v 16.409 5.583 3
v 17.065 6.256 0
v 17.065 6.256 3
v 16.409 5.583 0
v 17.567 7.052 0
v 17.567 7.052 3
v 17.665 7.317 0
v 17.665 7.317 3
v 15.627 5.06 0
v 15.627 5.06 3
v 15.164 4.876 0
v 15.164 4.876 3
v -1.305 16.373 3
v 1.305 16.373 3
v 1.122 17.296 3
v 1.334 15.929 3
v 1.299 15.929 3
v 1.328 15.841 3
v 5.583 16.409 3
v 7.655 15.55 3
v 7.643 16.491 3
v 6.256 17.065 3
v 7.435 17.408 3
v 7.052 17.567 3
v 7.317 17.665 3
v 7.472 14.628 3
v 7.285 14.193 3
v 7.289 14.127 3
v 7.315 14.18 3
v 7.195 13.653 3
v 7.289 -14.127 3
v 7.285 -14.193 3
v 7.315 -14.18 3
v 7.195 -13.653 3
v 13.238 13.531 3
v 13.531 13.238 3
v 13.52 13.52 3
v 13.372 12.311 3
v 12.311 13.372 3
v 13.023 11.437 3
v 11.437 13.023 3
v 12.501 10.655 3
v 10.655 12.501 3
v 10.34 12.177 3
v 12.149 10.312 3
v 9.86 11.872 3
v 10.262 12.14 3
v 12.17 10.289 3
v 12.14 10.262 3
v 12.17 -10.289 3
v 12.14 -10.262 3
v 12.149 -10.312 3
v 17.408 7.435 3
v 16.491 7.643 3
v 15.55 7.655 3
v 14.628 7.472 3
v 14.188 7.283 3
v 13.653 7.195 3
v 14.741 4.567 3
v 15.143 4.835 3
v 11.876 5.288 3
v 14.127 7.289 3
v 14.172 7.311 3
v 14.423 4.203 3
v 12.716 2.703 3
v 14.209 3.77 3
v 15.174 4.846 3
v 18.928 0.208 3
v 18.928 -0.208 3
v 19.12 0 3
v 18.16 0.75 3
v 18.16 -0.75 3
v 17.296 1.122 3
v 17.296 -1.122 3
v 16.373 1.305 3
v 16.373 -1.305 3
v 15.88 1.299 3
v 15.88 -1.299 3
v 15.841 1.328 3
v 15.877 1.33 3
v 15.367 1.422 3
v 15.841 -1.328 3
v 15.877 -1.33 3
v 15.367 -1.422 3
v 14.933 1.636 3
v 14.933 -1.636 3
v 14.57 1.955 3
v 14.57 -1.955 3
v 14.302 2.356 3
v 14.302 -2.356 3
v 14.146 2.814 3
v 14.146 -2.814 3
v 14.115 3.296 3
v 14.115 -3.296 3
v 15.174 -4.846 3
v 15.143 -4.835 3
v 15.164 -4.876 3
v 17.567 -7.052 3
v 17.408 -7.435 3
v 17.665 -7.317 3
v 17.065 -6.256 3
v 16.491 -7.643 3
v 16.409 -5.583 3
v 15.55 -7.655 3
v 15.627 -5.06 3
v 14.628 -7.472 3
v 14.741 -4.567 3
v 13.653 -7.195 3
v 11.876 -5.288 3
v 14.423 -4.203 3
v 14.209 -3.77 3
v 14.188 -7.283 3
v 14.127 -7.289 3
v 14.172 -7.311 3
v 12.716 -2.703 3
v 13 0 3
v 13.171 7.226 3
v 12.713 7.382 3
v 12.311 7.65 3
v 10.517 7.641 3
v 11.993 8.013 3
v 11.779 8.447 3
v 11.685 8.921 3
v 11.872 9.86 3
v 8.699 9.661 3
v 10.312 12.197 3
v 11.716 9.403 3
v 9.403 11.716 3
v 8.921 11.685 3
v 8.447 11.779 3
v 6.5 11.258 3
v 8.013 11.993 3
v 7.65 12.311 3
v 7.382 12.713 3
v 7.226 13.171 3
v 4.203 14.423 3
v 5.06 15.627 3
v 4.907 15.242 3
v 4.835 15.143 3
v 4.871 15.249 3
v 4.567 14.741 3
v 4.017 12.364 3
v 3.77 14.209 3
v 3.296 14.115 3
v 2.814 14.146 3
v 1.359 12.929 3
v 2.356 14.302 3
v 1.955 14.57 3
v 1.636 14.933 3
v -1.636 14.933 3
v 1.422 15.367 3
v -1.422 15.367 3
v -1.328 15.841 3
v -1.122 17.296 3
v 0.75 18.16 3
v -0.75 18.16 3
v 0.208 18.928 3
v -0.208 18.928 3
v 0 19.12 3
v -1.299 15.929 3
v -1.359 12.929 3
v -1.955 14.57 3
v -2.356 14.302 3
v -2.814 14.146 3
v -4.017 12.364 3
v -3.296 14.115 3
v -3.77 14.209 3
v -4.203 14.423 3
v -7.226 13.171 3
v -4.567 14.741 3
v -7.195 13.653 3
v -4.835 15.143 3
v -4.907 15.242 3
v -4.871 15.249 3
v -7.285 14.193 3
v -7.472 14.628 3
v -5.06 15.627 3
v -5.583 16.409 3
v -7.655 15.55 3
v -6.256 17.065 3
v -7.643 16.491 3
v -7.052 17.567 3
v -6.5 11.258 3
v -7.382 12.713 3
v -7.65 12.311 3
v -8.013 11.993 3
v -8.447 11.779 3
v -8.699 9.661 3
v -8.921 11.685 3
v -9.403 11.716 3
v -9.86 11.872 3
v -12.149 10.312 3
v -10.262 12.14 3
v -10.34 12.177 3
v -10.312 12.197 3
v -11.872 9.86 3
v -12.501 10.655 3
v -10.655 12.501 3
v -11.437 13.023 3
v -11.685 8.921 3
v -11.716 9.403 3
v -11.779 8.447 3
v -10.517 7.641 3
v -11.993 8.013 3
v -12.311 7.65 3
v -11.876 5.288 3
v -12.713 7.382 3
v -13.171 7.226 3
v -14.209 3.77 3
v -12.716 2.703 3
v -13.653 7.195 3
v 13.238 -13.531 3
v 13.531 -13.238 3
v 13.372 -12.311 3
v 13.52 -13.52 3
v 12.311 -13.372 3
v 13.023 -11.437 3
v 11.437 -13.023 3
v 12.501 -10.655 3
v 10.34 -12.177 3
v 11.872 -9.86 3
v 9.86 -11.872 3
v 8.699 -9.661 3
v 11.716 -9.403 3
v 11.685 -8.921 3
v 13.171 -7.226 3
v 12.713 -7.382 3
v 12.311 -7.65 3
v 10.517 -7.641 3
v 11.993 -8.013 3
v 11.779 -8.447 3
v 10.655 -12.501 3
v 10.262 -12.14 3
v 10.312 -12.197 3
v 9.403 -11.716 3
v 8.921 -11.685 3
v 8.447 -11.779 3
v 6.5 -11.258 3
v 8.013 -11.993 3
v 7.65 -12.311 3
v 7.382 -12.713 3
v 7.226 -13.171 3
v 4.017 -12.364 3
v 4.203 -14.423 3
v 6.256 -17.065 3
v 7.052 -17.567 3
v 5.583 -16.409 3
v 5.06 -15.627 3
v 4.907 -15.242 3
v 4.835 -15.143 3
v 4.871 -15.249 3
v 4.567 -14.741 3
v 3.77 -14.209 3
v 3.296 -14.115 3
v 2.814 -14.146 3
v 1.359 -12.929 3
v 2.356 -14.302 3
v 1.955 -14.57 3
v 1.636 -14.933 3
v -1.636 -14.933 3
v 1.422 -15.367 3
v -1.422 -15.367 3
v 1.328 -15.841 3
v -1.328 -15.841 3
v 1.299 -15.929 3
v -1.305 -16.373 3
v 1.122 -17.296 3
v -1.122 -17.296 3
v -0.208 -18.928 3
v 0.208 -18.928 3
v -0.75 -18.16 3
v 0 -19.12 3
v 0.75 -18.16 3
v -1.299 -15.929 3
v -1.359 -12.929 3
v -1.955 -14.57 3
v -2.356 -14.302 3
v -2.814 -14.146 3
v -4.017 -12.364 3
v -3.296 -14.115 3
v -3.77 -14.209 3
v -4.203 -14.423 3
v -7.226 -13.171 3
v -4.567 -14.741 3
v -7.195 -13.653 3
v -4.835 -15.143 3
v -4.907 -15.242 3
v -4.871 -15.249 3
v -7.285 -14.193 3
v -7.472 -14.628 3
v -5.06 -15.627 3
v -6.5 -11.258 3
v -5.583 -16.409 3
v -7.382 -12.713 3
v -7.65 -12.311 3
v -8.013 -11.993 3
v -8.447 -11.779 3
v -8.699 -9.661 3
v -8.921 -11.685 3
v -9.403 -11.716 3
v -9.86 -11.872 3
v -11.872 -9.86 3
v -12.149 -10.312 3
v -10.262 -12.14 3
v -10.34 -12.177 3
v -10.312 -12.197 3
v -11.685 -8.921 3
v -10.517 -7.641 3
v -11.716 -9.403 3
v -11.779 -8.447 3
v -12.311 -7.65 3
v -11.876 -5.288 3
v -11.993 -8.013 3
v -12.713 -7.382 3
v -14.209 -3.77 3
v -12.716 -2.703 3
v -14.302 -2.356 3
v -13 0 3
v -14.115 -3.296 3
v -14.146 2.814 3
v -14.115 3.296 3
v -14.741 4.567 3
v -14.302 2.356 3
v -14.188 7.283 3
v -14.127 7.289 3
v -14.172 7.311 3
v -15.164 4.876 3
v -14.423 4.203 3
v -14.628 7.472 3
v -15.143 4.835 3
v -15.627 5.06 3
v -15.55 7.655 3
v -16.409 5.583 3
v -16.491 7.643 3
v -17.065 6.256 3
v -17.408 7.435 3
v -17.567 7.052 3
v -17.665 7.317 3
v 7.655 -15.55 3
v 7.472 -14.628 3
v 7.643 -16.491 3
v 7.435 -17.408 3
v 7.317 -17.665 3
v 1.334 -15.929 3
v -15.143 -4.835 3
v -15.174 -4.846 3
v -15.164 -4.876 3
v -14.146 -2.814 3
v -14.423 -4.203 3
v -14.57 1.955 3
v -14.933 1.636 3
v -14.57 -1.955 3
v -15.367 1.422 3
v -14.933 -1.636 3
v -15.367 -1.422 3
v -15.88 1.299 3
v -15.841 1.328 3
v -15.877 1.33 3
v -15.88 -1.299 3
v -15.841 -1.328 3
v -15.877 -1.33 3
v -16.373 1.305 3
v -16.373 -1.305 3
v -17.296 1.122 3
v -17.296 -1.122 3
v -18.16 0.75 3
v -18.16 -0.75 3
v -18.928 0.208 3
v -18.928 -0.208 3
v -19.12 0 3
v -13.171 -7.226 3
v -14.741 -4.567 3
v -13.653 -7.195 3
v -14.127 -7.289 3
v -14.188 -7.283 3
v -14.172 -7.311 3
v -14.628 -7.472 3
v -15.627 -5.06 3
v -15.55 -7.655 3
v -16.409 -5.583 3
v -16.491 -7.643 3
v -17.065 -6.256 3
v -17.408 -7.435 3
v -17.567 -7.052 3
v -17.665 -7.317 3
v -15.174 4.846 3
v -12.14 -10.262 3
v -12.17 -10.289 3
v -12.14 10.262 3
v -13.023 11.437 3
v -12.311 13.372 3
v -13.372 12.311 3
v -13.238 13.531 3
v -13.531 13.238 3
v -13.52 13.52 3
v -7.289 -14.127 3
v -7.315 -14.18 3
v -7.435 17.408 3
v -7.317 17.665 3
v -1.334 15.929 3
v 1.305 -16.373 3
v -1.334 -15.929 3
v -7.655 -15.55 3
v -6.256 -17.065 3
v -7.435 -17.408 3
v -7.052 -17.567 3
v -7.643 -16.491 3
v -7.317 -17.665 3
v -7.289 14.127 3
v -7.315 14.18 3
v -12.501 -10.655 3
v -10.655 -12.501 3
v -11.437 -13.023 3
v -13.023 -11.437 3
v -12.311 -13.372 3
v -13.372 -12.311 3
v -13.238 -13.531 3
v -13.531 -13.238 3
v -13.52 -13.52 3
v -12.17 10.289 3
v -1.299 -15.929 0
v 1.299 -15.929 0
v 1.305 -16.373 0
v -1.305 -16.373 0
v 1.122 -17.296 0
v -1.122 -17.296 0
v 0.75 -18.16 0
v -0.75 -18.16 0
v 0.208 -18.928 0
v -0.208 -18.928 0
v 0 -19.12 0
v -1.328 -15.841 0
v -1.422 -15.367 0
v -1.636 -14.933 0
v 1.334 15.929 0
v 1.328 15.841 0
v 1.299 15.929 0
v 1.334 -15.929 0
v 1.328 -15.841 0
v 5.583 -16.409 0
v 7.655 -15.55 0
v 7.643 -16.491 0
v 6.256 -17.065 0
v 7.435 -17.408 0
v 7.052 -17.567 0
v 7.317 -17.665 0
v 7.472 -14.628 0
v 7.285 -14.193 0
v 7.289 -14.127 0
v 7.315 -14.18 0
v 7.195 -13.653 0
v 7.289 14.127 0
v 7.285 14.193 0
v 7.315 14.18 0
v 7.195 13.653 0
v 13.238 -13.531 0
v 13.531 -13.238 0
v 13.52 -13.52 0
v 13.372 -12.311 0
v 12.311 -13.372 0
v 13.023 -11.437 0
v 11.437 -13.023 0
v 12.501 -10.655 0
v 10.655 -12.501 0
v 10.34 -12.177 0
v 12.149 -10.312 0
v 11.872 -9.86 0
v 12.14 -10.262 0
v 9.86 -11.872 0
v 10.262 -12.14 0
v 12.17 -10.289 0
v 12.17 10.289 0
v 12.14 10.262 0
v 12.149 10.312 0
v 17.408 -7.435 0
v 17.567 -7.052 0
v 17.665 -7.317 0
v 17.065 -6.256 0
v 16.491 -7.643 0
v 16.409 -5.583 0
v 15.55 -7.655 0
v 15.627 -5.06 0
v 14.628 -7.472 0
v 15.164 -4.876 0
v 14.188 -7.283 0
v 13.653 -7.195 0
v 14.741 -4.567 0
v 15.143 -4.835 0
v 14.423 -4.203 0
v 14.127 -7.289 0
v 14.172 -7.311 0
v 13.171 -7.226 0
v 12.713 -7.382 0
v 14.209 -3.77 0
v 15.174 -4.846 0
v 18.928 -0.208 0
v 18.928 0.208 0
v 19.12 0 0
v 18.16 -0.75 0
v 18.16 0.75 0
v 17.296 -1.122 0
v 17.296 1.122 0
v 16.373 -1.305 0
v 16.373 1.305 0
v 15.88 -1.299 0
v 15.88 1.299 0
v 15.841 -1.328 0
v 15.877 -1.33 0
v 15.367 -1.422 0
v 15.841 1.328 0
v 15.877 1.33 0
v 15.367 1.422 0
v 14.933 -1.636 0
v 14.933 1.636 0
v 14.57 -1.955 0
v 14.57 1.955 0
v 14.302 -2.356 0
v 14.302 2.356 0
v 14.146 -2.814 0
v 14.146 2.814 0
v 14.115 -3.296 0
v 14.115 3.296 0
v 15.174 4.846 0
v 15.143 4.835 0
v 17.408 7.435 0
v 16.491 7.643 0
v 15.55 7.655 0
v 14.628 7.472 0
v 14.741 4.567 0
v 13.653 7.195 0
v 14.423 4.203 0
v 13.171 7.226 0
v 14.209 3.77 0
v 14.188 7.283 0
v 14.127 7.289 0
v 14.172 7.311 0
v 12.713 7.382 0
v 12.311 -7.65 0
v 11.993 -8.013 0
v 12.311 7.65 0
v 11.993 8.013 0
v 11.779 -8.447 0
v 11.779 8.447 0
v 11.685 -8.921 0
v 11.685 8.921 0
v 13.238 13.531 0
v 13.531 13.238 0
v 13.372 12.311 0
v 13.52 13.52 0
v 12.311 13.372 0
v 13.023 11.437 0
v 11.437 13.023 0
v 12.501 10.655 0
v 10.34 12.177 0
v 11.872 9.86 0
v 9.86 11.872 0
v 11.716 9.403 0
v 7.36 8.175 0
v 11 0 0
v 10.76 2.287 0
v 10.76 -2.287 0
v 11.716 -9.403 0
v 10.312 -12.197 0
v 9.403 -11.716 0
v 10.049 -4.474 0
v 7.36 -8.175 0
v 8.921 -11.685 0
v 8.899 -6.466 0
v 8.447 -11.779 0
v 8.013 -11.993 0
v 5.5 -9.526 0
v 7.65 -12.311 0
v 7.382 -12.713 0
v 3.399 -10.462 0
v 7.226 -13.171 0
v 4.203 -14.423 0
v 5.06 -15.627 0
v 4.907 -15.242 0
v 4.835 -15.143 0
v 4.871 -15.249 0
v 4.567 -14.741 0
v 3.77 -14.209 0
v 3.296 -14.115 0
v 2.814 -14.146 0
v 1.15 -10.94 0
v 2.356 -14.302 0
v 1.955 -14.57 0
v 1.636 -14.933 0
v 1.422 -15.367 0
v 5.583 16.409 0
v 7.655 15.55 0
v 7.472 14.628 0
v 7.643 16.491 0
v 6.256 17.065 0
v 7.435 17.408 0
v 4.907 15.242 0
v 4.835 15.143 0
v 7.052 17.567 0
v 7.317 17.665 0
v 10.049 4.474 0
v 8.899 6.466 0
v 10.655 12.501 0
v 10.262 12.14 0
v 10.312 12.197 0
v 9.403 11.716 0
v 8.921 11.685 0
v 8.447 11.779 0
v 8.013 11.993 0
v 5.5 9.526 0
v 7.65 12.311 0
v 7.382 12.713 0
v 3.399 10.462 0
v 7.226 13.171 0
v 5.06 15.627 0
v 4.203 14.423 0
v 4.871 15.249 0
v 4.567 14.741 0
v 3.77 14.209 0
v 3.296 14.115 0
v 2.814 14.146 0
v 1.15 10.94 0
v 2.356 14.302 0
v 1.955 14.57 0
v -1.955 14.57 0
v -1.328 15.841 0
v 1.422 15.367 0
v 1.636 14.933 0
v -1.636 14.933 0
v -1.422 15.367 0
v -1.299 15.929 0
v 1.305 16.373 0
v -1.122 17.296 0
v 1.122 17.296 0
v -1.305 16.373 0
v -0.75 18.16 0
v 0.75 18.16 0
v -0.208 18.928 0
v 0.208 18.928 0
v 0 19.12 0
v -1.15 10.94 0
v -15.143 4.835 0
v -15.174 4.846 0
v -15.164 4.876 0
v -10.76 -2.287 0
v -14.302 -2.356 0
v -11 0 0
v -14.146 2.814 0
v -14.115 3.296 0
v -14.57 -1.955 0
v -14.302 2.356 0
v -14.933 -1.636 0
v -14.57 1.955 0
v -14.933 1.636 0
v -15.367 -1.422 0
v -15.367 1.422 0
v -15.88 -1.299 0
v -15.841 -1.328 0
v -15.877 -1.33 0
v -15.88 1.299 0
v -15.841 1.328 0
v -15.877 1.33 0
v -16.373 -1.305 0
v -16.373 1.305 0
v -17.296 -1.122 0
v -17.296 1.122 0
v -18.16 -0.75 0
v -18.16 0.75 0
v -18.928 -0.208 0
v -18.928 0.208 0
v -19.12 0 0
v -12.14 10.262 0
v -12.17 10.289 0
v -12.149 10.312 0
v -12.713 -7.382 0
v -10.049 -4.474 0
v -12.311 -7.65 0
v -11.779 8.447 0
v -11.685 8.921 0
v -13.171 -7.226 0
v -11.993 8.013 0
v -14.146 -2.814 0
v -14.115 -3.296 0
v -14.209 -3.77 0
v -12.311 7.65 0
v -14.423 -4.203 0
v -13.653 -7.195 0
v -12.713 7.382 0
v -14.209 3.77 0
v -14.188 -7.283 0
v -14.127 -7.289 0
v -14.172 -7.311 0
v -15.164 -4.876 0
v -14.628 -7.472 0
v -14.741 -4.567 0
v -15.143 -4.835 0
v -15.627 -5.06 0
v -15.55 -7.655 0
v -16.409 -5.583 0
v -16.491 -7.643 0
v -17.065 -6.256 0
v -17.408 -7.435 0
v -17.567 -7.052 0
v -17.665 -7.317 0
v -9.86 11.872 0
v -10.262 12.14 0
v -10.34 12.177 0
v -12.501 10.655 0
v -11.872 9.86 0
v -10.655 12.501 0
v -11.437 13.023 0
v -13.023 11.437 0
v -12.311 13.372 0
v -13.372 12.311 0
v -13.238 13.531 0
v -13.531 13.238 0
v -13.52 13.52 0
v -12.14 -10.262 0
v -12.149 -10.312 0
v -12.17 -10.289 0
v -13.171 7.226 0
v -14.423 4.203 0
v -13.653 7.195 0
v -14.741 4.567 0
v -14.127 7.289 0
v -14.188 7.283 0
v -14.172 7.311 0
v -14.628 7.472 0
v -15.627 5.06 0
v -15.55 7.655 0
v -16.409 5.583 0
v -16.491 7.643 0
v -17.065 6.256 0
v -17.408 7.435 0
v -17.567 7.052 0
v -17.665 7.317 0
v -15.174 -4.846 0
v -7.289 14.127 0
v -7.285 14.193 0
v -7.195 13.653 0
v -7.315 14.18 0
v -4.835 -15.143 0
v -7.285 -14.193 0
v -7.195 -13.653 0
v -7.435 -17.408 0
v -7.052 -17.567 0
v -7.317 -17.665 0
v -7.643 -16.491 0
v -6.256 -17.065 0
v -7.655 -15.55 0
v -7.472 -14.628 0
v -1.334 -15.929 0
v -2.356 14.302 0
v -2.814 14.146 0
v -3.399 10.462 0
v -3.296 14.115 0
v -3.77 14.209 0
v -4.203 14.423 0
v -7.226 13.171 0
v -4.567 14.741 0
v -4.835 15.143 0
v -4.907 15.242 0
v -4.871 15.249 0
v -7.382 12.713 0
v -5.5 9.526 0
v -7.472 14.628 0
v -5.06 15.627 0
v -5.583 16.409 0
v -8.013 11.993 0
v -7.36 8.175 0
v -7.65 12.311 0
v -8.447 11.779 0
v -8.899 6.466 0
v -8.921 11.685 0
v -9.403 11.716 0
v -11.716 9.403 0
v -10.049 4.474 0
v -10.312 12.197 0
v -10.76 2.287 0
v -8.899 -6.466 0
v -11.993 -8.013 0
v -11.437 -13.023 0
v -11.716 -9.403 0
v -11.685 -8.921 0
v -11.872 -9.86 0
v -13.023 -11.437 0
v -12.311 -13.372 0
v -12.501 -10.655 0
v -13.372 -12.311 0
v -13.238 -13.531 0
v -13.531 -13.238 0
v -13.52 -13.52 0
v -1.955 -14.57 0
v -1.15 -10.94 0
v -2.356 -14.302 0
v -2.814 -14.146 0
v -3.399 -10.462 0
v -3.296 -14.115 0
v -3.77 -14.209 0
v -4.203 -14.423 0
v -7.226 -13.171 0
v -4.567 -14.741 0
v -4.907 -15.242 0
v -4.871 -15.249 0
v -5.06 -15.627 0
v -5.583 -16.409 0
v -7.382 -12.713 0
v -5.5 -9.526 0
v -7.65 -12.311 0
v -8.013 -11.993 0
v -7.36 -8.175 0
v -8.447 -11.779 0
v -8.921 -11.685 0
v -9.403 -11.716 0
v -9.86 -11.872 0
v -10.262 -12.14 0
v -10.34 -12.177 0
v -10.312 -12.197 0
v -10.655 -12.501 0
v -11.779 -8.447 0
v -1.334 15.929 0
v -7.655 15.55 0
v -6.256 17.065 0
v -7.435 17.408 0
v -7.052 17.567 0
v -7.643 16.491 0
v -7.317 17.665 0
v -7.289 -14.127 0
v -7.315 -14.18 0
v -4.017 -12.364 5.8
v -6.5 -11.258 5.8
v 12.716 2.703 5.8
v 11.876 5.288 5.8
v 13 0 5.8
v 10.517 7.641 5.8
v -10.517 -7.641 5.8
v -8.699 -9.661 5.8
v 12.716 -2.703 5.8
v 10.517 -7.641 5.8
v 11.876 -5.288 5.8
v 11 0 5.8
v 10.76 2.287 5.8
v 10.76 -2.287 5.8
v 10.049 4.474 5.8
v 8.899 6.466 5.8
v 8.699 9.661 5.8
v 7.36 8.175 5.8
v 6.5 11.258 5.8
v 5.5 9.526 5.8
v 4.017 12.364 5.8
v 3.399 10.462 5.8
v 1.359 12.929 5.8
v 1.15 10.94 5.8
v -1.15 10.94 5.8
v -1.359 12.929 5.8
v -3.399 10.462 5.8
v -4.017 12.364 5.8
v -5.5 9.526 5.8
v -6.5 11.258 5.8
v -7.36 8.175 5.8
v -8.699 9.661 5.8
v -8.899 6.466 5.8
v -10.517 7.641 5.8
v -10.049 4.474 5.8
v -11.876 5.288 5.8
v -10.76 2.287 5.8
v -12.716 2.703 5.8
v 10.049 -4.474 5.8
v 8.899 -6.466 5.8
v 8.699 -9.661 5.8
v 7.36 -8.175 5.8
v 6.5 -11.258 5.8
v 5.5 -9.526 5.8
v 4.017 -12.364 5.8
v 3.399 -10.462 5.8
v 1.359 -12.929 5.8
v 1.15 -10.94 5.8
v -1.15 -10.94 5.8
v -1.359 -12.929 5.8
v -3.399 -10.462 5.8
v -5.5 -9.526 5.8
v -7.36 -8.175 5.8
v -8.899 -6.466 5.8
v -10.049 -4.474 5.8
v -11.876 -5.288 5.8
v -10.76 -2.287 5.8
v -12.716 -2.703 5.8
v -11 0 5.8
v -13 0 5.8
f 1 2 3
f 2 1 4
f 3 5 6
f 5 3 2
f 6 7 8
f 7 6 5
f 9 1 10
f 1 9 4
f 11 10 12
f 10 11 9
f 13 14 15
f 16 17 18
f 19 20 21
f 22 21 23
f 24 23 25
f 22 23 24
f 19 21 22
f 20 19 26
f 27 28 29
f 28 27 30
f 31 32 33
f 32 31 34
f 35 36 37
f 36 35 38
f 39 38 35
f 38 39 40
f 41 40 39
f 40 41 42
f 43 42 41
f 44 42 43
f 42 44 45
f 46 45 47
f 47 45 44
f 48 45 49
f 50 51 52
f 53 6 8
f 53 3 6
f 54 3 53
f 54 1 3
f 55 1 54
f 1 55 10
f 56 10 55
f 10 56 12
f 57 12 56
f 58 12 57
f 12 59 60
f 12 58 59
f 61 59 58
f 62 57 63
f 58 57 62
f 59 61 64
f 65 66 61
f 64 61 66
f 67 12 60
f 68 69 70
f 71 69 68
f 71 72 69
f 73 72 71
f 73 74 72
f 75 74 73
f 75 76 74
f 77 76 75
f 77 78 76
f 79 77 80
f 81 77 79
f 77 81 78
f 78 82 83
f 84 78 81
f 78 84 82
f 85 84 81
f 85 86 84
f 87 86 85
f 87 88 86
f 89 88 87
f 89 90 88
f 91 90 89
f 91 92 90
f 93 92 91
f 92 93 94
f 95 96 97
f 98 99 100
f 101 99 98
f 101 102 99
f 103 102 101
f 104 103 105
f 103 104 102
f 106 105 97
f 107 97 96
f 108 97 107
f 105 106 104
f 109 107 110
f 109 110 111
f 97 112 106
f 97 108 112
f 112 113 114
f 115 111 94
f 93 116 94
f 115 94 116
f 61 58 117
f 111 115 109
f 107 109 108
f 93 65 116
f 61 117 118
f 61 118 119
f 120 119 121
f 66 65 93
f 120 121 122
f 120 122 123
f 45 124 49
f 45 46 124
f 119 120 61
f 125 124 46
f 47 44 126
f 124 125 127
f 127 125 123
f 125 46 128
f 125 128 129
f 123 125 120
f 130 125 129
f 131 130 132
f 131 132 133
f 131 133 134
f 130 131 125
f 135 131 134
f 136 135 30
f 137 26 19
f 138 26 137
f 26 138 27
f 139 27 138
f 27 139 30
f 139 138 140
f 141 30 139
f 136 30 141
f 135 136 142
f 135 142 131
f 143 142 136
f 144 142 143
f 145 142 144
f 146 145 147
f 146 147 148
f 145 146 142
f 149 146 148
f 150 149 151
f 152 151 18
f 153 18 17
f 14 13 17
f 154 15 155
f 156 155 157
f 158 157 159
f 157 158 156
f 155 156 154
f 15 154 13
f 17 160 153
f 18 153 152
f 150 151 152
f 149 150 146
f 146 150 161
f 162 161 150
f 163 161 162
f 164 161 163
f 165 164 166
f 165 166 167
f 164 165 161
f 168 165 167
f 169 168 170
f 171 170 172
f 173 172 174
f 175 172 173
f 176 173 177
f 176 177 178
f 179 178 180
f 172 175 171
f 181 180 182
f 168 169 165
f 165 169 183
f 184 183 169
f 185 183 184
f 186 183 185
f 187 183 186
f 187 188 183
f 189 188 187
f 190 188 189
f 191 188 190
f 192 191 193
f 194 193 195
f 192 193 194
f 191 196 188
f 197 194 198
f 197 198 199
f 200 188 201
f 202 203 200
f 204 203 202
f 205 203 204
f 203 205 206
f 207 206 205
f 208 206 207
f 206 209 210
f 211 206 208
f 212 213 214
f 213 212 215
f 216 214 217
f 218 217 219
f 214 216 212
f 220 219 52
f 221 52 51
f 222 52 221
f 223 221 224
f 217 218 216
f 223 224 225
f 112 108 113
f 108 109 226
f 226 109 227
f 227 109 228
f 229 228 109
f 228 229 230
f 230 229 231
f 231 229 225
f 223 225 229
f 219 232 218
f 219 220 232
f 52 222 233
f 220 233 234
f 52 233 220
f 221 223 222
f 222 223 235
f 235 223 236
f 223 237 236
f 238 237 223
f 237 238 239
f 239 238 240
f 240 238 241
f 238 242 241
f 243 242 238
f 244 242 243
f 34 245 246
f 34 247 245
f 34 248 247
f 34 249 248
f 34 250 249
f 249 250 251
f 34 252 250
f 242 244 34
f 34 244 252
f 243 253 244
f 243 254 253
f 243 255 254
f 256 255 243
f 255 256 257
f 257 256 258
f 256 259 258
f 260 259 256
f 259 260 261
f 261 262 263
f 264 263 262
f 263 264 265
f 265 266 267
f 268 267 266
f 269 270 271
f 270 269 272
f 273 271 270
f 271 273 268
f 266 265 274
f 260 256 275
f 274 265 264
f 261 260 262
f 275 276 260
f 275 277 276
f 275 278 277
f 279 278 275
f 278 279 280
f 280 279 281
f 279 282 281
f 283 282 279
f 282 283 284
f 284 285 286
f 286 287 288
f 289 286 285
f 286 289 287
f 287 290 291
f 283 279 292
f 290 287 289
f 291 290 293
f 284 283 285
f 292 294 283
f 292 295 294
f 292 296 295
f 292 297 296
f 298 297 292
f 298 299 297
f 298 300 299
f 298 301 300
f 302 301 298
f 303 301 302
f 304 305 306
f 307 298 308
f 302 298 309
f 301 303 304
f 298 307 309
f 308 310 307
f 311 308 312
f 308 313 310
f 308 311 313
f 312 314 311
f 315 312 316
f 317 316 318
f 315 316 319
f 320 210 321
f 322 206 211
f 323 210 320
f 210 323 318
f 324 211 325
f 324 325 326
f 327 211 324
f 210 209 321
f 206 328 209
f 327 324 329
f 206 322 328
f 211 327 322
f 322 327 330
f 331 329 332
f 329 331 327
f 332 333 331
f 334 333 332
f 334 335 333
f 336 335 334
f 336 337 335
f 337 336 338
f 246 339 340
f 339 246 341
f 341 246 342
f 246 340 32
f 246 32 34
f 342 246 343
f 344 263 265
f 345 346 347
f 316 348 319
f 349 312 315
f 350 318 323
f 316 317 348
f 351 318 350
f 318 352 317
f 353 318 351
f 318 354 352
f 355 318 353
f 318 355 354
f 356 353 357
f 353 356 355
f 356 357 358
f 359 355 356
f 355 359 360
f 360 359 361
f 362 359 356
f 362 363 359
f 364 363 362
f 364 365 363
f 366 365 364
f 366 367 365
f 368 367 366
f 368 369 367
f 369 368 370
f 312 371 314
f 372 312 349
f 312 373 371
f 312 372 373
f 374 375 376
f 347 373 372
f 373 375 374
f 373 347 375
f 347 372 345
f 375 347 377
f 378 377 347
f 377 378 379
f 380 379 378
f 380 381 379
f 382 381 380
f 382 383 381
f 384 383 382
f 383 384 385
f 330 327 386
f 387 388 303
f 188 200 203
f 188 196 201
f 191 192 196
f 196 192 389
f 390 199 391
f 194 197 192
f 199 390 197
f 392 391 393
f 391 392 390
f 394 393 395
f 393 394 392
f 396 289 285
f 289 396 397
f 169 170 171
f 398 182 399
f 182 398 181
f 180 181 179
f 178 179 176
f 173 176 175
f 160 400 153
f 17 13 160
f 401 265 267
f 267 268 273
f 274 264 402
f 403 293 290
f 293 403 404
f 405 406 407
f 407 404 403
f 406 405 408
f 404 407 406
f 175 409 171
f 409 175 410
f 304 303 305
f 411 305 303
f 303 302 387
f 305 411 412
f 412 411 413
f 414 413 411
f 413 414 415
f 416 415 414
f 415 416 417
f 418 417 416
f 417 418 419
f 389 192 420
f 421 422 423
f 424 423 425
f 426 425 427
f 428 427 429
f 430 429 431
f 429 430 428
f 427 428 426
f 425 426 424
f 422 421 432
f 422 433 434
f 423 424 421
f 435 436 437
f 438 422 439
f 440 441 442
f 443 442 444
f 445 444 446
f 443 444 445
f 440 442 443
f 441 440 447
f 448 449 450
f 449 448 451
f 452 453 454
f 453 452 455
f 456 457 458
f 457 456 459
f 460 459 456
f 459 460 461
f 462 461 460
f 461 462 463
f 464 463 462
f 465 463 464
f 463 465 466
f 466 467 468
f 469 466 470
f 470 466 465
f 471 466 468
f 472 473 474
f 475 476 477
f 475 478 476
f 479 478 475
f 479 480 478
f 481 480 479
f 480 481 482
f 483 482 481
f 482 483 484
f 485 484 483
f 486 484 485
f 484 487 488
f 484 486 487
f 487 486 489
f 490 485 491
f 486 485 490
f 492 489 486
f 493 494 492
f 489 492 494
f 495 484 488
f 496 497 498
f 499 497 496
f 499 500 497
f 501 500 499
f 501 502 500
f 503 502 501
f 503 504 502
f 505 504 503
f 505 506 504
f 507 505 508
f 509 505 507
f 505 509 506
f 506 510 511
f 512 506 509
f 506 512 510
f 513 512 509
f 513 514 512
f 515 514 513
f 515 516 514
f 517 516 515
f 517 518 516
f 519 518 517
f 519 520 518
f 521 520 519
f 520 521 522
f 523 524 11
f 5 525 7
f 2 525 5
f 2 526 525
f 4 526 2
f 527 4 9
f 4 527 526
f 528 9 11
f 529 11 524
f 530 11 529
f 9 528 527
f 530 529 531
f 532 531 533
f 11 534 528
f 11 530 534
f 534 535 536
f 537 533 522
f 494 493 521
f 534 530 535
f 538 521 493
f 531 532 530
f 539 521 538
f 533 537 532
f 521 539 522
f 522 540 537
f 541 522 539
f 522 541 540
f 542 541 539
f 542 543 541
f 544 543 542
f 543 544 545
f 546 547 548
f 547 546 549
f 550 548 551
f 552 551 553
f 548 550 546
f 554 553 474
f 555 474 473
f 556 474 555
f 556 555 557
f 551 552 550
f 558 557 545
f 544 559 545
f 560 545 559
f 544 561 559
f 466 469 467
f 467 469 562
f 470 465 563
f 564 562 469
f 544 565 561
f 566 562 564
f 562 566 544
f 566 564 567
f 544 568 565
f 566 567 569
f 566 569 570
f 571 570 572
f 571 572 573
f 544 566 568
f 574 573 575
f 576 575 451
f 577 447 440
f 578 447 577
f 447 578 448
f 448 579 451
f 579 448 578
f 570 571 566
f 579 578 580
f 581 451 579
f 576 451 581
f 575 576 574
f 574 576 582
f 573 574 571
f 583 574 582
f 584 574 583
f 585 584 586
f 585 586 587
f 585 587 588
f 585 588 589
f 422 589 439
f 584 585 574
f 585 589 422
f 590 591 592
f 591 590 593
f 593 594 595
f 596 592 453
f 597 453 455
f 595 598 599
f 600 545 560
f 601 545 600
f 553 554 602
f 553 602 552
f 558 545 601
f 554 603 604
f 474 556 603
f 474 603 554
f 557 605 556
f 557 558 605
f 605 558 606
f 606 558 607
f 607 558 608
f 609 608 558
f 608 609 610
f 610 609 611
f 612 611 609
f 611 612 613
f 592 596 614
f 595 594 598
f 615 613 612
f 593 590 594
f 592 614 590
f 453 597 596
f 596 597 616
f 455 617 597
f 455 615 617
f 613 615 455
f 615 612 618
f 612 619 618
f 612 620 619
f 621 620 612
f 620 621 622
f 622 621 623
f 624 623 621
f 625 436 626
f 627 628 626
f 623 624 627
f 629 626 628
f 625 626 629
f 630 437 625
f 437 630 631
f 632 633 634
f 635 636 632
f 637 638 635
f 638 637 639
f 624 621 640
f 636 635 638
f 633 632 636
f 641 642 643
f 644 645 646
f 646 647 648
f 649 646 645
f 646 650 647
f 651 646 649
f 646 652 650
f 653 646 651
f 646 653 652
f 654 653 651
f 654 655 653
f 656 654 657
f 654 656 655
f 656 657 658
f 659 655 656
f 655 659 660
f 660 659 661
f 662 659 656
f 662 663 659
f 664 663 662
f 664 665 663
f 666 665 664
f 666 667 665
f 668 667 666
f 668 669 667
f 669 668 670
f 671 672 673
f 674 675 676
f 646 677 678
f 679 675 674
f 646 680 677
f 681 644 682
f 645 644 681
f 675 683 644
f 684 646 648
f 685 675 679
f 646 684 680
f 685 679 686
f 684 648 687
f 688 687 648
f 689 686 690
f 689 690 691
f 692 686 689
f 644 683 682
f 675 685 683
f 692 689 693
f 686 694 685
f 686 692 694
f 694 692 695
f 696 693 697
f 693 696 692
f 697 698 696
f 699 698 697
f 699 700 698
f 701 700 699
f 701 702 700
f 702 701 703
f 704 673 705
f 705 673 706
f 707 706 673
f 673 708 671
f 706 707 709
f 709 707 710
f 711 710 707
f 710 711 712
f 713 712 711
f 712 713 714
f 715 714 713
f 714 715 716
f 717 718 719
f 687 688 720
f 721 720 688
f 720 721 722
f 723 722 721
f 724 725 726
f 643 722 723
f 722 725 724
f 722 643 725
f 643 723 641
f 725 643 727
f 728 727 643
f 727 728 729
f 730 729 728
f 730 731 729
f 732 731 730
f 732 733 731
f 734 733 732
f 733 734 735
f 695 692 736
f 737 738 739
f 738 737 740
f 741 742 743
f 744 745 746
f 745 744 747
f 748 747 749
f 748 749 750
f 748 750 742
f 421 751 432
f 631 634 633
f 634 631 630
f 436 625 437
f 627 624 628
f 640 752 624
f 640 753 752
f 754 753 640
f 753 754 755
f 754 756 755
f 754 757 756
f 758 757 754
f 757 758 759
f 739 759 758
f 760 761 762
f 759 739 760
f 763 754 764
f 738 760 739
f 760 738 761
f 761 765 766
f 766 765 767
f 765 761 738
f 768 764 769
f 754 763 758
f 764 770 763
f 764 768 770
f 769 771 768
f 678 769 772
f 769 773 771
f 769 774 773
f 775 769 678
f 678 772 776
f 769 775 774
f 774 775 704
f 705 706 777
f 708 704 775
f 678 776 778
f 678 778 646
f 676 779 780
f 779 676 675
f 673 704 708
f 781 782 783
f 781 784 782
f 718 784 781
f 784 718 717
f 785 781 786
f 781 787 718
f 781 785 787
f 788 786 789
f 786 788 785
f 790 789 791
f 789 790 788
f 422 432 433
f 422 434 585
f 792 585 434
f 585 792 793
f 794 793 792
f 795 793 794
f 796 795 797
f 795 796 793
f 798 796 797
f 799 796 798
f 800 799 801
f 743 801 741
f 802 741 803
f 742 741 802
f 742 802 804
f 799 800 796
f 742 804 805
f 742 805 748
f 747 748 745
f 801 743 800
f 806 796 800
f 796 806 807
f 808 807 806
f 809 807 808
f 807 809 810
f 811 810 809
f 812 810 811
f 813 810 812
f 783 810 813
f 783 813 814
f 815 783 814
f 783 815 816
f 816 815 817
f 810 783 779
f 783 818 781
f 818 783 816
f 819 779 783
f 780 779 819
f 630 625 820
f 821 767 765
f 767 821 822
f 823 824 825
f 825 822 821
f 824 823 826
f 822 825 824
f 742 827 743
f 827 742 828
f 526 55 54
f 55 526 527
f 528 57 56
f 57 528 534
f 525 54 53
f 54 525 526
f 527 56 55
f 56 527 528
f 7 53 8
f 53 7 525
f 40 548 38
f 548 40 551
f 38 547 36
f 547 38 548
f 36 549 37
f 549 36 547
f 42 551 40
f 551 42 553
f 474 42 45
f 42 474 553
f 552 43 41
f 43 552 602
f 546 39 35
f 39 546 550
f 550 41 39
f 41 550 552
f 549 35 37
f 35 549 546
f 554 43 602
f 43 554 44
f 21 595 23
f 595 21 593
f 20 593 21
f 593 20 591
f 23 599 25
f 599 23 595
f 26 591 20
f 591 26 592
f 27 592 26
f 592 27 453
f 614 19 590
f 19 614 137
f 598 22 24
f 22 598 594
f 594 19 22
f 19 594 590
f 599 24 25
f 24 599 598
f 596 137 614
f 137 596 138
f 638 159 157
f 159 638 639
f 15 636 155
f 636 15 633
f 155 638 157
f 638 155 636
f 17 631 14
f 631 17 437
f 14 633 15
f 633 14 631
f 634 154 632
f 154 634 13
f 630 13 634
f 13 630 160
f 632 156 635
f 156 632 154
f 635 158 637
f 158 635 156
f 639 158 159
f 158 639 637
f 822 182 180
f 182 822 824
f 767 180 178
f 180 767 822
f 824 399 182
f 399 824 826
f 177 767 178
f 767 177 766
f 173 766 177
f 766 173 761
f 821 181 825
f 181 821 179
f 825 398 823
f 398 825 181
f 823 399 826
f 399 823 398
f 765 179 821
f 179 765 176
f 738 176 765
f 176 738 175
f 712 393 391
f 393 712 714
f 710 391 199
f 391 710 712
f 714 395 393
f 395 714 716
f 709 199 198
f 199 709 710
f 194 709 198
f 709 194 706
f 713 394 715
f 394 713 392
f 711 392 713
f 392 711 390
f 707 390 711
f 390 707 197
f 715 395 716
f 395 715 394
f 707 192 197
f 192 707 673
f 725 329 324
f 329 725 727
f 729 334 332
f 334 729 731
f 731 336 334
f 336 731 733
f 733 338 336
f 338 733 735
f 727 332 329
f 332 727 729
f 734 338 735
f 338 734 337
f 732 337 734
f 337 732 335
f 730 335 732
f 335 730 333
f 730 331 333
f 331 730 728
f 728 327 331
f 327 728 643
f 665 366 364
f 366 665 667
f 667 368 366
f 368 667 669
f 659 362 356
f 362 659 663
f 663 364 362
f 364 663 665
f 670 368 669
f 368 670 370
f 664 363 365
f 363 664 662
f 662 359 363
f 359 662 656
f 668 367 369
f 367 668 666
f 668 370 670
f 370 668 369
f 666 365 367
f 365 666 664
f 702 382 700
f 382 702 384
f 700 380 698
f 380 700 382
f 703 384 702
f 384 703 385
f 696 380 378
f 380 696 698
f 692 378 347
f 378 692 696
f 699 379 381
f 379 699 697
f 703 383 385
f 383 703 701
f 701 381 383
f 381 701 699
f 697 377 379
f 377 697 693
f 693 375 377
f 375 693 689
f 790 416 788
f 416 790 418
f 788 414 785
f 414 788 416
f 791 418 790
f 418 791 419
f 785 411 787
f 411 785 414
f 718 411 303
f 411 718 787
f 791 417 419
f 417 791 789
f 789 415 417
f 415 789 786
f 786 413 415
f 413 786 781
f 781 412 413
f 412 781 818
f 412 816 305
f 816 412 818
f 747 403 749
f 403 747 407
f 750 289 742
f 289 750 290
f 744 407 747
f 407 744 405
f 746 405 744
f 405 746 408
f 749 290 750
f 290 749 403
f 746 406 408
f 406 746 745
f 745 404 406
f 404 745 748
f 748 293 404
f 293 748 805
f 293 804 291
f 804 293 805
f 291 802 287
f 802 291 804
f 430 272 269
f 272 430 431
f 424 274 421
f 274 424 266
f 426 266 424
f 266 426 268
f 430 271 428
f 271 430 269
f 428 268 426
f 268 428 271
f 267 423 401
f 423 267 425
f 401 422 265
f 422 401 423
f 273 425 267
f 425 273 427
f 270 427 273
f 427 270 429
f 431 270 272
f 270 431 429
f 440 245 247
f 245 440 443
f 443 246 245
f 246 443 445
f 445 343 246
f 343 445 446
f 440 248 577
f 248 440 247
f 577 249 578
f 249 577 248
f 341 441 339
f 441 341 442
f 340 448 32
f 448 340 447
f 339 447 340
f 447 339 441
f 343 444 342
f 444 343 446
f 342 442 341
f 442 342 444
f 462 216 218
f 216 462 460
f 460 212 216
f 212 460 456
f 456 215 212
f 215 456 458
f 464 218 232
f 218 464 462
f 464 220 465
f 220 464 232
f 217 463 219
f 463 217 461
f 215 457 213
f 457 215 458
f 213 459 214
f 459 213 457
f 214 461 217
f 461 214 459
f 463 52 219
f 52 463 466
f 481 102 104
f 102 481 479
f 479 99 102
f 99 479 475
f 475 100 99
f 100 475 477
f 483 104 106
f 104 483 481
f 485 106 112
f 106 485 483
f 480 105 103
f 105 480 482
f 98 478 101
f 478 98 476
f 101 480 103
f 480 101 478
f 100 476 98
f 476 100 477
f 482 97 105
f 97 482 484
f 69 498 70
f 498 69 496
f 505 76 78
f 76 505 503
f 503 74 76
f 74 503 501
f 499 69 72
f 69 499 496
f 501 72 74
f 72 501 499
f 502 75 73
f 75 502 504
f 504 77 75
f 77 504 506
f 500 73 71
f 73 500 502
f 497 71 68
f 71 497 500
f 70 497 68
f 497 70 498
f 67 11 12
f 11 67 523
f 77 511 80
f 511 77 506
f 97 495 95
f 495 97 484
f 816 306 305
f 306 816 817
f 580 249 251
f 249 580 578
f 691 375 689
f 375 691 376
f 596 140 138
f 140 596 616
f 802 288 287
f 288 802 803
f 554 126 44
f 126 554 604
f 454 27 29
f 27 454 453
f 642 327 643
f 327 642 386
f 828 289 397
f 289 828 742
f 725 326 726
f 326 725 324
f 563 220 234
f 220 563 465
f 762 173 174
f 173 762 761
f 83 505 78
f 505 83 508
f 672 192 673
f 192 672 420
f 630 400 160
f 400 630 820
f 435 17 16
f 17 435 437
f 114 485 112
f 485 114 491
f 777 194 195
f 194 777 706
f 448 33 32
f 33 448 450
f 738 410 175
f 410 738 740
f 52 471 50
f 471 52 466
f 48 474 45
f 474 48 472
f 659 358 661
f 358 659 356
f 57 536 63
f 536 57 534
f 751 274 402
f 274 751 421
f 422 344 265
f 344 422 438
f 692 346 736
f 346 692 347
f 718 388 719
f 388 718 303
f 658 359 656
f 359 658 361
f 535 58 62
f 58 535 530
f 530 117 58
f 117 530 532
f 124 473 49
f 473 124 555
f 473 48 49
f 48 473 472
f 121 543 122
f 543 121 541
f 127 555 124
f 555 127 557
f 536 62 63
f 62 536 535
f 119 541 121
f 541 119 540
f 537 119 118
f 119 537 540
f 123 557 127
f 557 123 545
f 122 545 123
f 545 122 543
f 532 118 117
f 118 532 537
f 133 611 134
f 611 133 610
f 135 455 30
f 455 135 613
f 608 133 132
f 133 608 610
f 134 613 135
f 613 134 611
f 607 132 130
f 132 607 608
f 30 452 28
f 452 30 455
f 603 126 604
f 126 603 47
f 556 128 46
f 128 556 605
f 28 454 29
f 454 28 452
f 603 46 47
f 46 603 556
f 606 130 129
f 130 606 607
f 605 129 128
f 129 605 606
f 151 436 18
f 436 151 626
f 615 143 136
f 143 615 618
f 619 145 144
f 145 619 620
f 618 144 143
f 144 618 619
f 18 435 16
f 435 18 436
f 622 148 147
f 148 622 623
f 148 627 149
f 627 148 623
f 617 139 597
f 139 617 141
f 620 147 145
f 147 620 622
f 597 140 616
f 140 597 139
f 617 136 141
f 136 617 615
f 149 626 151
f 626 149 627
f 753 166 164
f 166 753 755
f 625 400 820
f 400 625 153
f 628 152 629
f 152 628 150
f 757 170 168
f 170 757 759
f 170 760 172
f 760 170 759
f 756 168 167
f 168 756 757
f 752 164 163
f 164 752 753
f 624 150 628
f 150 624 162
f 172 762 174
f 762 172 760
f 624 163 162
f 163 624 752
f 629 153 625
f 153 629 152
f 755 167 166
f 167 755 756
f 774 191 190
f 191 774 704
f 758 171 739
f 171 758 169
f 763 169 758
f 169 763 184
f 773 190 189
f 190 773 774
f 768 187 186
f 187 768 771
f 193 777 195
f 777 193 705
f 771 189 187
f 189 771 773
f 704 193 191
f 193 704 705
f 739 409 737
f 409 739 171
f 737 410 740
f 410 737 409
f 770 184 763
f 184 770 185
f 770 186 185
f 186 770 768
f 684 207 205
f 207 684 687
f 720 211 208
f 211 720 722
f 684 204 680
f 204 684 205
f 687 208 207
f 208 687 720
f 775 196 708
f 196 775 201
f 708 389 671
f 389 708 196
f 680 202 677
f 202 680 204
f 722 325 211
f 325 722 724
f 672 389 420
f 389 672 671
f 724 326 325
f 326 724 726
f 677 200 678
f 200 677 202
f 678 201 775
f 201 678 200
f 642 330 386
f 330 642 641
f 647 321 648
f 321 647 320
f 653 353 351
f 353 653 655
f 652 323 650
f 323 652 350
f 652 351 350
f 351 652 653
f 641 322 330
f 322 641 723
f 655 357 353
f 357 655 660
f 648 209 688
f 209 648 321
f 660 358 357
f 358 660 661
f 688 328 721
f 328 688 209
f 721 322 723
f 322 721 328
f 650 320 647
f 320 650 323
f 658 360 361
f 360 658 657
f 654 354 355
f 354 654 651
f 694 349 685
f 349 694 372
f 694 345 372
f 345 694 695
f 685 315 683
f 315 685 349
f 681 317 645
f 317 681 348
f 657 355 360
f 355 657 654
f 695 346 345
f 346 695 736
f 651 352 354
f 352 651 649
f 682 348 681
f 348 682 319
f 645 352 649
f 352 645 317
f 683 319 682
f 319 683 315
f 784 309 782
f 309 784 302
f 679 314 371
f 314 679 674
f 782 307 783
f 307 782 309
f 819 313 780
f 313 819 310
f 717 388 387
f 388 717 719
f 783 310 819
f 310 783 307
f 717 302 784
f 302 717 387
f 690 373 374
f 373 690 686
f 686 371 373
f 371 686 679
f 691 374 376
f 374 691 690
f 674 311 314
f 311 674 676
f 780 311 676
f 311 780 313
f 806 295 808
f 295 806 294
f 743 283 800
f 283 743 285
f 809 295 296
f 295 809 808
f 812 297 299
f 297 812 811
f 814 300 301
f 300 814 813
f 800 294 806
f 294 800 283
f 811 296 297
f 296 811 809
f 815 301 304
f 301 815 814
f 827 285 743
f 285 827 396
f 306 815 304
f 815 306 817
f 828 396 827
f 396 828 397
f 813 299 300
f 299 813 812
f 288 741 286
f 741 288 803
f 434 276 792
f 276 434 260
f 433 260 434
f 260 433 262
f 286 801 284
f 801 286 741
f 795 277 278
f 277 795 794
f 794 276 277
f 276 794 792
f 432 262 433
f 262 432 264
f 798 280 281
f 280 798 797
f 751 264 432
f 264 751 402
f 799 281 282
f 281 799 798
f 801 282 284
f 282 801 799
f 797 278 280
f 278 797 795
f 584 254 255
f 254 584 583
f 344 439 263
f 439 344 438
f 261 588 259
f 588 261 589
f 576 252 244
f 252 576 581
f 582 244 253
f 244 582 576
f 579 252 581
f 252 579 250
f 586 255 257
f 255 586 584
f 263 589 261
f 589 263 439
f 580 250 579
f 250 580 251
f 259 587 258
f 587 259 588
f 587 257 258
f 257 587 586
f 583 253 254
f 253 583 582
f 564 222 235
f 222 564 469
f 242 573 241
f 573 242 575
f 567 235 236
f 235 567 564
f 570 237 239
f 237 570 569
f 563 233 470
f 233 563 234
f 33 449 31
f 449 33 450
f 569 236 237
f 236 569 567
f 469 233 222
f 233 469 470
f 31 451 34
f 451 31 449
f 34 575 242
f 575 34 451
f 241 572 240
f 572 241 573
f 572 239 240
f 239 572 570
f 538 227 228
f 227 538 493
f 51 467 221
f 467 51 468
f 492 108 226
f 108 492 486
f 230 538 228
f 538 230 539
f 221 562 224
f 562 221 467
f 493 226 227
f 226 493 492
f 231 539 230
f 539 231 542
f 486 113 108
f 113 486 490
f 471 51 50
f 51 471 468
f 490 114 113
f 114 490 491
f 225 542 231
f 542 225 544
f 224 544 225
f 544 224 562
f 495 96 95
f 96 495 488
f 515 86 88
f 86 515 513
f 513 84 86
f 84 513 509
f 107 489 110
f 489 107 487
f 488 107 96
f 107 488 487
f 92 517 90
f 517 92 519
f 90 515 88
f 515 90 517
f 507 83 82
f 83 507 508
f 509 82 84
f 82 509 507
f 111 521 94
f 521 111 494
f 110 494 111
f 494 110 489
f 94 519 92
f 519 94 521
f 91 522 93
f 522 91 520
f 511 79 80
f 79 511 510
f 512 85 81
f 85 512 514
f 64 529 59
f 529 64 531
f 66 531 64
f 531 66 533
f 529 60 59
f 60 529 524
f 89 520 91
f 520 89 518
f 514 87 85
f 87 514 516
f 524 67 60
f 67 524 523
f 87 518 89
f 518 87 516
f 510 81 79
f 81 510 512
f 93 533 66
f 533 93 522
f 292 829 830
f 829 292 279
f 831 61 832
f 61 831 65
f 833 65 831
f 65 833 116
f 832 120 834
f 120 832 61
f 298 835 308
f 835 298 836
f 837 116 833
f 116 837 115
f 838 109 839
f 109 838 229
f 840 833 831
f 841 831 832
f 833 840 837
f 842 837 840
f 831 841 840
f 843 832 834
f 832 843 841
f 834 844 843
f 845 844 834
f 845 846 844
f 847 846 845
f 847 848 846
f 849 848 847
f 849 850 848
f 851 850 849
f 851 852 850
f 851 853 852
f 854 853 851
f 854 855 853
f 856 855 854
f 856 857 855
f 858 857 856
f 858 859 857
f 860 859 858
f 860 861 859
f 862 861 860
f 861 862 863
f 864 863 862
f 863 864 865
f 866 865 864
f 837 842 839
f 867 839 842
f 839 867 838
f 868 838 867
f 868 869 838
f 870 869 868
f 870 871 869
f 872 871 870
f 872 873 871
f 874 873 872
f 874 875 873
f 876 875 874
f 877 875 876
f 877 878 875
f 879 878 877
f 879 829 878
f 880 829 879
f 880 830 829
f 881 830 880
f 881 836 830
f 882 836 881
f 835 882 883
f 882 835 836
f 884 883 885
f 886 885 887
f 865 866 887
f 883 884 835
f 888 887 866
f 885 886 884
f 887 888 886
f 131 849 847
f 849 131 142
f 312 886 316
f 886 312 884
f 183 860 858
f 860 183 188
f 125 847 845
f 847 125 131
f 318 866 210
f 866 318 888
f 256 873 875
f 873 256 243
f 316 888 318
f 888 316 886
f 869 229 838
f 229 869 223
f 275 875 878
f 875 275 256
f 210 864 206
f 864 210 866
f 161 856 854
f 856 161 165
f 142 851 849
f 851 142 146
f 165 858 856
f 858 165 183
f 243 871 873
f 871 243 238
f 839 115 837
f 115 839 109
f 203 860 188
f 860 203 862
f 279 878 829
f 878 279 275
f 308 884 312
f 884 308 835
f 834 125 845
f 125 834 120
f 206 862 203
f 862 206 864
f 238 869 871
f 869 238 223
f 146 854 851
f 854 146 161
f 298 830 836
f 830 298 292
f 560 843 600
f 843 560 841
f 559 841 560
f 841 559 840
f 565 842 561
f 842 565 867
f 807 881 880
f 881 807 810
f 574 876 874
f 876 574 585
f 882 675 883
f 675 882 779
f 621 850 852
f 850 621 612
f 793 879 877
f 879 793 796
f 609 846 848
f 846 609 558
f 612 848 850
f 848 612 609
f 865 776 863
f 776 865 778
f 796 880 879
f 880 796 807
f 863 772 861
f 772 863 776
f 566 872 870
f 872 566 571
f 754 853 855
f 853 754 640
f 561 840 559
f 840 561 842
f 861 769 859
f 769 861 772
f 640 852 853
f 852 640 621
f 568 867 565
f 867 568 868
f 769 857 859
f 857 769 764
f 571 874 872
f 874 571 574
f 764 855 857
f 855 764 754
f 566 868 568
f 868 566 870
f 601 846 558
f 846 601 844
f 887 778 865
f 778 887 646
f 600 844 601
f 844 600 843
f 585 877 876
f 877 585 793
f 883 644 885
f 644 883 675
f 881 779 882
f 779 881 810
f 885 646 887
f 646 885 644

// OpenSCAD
// file: ../MCAD/materials.scad
/*
 * Material colors.
 * 
 * Originally by Hans Häggström, 2010.
 * Dual licenced under Creative Commons Attribution-Share Alike 3.0 and LGPL2 or later
 */

// Material colors
Oak = [0.65, 0.5, 0.4];
Pine = [0.85, 0.7, 0.45];
Birch = [0.9, 0.8, 0.6];
FiberBoard = [0.7, 0.67, 0.6];
BlackPaint = [0.2, 0.2, 0.2];
Iron = [0.36, 0.33, 0.33];
Steel = [0.65, 0.67, 0.72];
Stainless = [0.45, 0.43, 0.5];
Aluminum = [0.77, 0.77, 0.8];
Brass = [0.88, 0.78, 0.5];
Transparent = [1, 1, 1, 0.2];

// Example, uncomment to view
//color_demo();

module color_demo(){
    // Wood
    colorTest(Oak, 0, 0);
    colorTest(Pine, 1, 0);
    colorTest(Birch, 2, 0);

    // Metals
    colorTest(Iron, 0, 1);
    colorTest(Steel, 1, 1);
    colorTest(Stainless, 2, 1);
    colorTest(Aluminum, 3, 1);

    // Mixboards
    colorTest(FiberBoard, 0, 2);

    // Paints
    colorTest(BlackPaint, 0, 3);
}

module colorTest(col, row=0, c=0) {
  color(col) translate([row * 30,c*30,0]) sphere(r=10);
}
// file: ../MCAD/units.scad
/*
 * Basic units.
 * 
 * Originally by Hans Häggström, 2010.
 * Dual licenced under Creative Commons Attribution-Share Alike 3.0 and LGPL2 or later
 */


mm = 1;
cm = 10 * mm;
dm = 100 * mm;
m = 1000 * mm;

inch = 25.4 * mm;

X = [1, 0, 0];
Y = [0, 1, 0];
Z = [0, 0, 1];

M3 = 3*mm;
M4 = 4*mm;
M5 = 5*mm;
M6 = 6*mm;
M8 = 8*mm;


// When a small distance is needed to overlap shapes for boolean cutting, etc.
epsilon = 0.01*mm;
// file: ../MCAD/bearing.scad
/*
 * Bearing model.
 *
 * Originally by Hans Häggström, 2010.
 * Dual licenced under Creative Commons Attribution-Share Alike 3.0 and LGPL2 or later
 */

include <units.scad>
include <materials.scad>

// Example, uncomment to view
//test_bearing();
//test_bearing_hole();

module test_bearing(){
    bearing();
    bearing(pos=[5*cm, 0,0], angle=[90,0,0]);
    bearing(pos=[-2.5*cm, 0,0], model=688);
}

module test_bearing_hole(){
    difference(){
      translate([0, 0, 3.5]) cube(size=[30, 30, 7-10*epsilon], center=true);
      bearing(outline=true);
    }
}

BEARING_INNER_DIAMETER = 0;
BEARING_OUTER_DIAMETER = 1;
BEARING_WIDTH = 2;

// Common bearing names
SkateBearing = 608;

// Bearing dimensions
// model == XXX ? [inner dia, outer dia, width]:
function bearingDimensions(model) =
  model == 608 ? [8*mm, 22*mm, 7*mm]:
  model == 623 ? [3*mm, 10*mm, 4*mm]:
  model == 624 ? [4*mm, 13*mm, 5*mm]:
  model == 627 ? [7*mm, 22*mm, 7*mm]:
  model == 688 ? [8*mm, 16*mm, 4*mm]:
  model == 698 ? [8*mm, 19*mm, 6*mm]:
  [8*mm, 22*mm, 7*mm]; // this is the default


function bearingWidth(model) = bearingDimensions(model)[BEARING_WIDTH];
function bearingInnerDiameter(model) = bearingDimensions(model)[BEARING_INNER_DIAMETER];
function bearingOuterDiameter(model) = bearingDimensions(model)[BEARING_OUTER_DIAMETER];

module bearing(pos=[0,0,0], angle=[0,0,0], model=SkateBearing, outline=false,
                material=Steel, sideMaterial=Brass) {
  // Common bearing names
  model =
    model == "Skate" ? 608 :
    model;

  w = bearingWidth(model);
  innerD = outline==false ? bearingInnerDiameter(model) : 0;
  outerD = bearingOuterDiameter(model);

  innerRim = innerD + (outerD - innerD) * 0.2;
  outerRim = outerD - (outerD - innerD) * 0.2;
  midSink = w * 0.1;

  translate(pos) rotate(angle) union() {
    color(material)
      difference() {
        // Basic ring
        Ring([0,0,0], outerD, innerD, w, material, material);

        if (outline==false) {
          // Side shields
          Ring([0,0,-epsilon], outerRim, innerRim, epsilon+midSink, sideMaterial, material);
          Ring([0,0,w-midSink], outerRim, innerRim, epsilon+midSink, sideMaterial, material);
        }
      }
  }

  module Ring(pos, od, id, h, material, holeMaterial) {
    color(material) {
      translate(pos)
        difference() {
          cylinder(r=od/2, h=h,  $fs = 0.01);
          color(holeMaterial)
            translate([0,0,-10*epsilon])
              cylinder(r=id/2, h=h+20*epsilon,  $fs = 0.01);
        }
    }
  }

}
// main file
use <../MCAD/bearing.scad>

module sprocket(teeth=20, roller=3, pitch=17, thickness=3, tolerance=0.2){
	$fs=0.5;
	roller=roller/2; //We need radius in our calculations, not diameter
	distance_from_center=pitch/(2*sin(180/teeth));
	echo(distance_from_center);
	angle=(360/teeth);
	pitch_circle=sqrt((distance_from_center*distance_from_center) - (pitch*(roller+tolerance))+((roller+tolerance)*(roller+tolerance)));
	echo(pitch_circle);
	difference(){
		union(){
			cylinder(r=pitch_circle,h=thickness);
			for(tooth=[1:teeth]){
				intersection(){
					rotate(a=[0,0,angle*(tooth+0.5)]){
						translate([distance_from_center,0,0]){
							cylinder(r=pitch-roller-tolerance,h=thickness);
						}
					}
					rotate(a=[0,0,angle*(tooth-0.5)]){
						translate([distance_from_center,0,0]){
							cylinder(r=pitch-roller-tolerance,h=thickness);
						}
					}
				}
			}
		}
		for(tooth=[1:teeth]){
			rotate(a=[0,0,angle*(tooth+0.5)]){
				translate([distance_from_center,0,-1]){
					cylinder(r=roller+tolerance,h=thickness+2);
				}
			}
		}
	}
}

thick= 0.126*25.4;
d= bearingOuterDiameter(608);
w= bearingWidth(608);

// #25
difference() {
	union() {
		sprocket(16,0.13*25.4,0.25*25.4,thick-0.2,0.2);
		translate([0,0,thick-0.3]) cylinder(r= d/2+2, h= w/2-thick/2+1);
	}
	cylinder(r=d/2, h= thick+w);
}

%translate([0,0,-w/2+thick/2]) bearing();
